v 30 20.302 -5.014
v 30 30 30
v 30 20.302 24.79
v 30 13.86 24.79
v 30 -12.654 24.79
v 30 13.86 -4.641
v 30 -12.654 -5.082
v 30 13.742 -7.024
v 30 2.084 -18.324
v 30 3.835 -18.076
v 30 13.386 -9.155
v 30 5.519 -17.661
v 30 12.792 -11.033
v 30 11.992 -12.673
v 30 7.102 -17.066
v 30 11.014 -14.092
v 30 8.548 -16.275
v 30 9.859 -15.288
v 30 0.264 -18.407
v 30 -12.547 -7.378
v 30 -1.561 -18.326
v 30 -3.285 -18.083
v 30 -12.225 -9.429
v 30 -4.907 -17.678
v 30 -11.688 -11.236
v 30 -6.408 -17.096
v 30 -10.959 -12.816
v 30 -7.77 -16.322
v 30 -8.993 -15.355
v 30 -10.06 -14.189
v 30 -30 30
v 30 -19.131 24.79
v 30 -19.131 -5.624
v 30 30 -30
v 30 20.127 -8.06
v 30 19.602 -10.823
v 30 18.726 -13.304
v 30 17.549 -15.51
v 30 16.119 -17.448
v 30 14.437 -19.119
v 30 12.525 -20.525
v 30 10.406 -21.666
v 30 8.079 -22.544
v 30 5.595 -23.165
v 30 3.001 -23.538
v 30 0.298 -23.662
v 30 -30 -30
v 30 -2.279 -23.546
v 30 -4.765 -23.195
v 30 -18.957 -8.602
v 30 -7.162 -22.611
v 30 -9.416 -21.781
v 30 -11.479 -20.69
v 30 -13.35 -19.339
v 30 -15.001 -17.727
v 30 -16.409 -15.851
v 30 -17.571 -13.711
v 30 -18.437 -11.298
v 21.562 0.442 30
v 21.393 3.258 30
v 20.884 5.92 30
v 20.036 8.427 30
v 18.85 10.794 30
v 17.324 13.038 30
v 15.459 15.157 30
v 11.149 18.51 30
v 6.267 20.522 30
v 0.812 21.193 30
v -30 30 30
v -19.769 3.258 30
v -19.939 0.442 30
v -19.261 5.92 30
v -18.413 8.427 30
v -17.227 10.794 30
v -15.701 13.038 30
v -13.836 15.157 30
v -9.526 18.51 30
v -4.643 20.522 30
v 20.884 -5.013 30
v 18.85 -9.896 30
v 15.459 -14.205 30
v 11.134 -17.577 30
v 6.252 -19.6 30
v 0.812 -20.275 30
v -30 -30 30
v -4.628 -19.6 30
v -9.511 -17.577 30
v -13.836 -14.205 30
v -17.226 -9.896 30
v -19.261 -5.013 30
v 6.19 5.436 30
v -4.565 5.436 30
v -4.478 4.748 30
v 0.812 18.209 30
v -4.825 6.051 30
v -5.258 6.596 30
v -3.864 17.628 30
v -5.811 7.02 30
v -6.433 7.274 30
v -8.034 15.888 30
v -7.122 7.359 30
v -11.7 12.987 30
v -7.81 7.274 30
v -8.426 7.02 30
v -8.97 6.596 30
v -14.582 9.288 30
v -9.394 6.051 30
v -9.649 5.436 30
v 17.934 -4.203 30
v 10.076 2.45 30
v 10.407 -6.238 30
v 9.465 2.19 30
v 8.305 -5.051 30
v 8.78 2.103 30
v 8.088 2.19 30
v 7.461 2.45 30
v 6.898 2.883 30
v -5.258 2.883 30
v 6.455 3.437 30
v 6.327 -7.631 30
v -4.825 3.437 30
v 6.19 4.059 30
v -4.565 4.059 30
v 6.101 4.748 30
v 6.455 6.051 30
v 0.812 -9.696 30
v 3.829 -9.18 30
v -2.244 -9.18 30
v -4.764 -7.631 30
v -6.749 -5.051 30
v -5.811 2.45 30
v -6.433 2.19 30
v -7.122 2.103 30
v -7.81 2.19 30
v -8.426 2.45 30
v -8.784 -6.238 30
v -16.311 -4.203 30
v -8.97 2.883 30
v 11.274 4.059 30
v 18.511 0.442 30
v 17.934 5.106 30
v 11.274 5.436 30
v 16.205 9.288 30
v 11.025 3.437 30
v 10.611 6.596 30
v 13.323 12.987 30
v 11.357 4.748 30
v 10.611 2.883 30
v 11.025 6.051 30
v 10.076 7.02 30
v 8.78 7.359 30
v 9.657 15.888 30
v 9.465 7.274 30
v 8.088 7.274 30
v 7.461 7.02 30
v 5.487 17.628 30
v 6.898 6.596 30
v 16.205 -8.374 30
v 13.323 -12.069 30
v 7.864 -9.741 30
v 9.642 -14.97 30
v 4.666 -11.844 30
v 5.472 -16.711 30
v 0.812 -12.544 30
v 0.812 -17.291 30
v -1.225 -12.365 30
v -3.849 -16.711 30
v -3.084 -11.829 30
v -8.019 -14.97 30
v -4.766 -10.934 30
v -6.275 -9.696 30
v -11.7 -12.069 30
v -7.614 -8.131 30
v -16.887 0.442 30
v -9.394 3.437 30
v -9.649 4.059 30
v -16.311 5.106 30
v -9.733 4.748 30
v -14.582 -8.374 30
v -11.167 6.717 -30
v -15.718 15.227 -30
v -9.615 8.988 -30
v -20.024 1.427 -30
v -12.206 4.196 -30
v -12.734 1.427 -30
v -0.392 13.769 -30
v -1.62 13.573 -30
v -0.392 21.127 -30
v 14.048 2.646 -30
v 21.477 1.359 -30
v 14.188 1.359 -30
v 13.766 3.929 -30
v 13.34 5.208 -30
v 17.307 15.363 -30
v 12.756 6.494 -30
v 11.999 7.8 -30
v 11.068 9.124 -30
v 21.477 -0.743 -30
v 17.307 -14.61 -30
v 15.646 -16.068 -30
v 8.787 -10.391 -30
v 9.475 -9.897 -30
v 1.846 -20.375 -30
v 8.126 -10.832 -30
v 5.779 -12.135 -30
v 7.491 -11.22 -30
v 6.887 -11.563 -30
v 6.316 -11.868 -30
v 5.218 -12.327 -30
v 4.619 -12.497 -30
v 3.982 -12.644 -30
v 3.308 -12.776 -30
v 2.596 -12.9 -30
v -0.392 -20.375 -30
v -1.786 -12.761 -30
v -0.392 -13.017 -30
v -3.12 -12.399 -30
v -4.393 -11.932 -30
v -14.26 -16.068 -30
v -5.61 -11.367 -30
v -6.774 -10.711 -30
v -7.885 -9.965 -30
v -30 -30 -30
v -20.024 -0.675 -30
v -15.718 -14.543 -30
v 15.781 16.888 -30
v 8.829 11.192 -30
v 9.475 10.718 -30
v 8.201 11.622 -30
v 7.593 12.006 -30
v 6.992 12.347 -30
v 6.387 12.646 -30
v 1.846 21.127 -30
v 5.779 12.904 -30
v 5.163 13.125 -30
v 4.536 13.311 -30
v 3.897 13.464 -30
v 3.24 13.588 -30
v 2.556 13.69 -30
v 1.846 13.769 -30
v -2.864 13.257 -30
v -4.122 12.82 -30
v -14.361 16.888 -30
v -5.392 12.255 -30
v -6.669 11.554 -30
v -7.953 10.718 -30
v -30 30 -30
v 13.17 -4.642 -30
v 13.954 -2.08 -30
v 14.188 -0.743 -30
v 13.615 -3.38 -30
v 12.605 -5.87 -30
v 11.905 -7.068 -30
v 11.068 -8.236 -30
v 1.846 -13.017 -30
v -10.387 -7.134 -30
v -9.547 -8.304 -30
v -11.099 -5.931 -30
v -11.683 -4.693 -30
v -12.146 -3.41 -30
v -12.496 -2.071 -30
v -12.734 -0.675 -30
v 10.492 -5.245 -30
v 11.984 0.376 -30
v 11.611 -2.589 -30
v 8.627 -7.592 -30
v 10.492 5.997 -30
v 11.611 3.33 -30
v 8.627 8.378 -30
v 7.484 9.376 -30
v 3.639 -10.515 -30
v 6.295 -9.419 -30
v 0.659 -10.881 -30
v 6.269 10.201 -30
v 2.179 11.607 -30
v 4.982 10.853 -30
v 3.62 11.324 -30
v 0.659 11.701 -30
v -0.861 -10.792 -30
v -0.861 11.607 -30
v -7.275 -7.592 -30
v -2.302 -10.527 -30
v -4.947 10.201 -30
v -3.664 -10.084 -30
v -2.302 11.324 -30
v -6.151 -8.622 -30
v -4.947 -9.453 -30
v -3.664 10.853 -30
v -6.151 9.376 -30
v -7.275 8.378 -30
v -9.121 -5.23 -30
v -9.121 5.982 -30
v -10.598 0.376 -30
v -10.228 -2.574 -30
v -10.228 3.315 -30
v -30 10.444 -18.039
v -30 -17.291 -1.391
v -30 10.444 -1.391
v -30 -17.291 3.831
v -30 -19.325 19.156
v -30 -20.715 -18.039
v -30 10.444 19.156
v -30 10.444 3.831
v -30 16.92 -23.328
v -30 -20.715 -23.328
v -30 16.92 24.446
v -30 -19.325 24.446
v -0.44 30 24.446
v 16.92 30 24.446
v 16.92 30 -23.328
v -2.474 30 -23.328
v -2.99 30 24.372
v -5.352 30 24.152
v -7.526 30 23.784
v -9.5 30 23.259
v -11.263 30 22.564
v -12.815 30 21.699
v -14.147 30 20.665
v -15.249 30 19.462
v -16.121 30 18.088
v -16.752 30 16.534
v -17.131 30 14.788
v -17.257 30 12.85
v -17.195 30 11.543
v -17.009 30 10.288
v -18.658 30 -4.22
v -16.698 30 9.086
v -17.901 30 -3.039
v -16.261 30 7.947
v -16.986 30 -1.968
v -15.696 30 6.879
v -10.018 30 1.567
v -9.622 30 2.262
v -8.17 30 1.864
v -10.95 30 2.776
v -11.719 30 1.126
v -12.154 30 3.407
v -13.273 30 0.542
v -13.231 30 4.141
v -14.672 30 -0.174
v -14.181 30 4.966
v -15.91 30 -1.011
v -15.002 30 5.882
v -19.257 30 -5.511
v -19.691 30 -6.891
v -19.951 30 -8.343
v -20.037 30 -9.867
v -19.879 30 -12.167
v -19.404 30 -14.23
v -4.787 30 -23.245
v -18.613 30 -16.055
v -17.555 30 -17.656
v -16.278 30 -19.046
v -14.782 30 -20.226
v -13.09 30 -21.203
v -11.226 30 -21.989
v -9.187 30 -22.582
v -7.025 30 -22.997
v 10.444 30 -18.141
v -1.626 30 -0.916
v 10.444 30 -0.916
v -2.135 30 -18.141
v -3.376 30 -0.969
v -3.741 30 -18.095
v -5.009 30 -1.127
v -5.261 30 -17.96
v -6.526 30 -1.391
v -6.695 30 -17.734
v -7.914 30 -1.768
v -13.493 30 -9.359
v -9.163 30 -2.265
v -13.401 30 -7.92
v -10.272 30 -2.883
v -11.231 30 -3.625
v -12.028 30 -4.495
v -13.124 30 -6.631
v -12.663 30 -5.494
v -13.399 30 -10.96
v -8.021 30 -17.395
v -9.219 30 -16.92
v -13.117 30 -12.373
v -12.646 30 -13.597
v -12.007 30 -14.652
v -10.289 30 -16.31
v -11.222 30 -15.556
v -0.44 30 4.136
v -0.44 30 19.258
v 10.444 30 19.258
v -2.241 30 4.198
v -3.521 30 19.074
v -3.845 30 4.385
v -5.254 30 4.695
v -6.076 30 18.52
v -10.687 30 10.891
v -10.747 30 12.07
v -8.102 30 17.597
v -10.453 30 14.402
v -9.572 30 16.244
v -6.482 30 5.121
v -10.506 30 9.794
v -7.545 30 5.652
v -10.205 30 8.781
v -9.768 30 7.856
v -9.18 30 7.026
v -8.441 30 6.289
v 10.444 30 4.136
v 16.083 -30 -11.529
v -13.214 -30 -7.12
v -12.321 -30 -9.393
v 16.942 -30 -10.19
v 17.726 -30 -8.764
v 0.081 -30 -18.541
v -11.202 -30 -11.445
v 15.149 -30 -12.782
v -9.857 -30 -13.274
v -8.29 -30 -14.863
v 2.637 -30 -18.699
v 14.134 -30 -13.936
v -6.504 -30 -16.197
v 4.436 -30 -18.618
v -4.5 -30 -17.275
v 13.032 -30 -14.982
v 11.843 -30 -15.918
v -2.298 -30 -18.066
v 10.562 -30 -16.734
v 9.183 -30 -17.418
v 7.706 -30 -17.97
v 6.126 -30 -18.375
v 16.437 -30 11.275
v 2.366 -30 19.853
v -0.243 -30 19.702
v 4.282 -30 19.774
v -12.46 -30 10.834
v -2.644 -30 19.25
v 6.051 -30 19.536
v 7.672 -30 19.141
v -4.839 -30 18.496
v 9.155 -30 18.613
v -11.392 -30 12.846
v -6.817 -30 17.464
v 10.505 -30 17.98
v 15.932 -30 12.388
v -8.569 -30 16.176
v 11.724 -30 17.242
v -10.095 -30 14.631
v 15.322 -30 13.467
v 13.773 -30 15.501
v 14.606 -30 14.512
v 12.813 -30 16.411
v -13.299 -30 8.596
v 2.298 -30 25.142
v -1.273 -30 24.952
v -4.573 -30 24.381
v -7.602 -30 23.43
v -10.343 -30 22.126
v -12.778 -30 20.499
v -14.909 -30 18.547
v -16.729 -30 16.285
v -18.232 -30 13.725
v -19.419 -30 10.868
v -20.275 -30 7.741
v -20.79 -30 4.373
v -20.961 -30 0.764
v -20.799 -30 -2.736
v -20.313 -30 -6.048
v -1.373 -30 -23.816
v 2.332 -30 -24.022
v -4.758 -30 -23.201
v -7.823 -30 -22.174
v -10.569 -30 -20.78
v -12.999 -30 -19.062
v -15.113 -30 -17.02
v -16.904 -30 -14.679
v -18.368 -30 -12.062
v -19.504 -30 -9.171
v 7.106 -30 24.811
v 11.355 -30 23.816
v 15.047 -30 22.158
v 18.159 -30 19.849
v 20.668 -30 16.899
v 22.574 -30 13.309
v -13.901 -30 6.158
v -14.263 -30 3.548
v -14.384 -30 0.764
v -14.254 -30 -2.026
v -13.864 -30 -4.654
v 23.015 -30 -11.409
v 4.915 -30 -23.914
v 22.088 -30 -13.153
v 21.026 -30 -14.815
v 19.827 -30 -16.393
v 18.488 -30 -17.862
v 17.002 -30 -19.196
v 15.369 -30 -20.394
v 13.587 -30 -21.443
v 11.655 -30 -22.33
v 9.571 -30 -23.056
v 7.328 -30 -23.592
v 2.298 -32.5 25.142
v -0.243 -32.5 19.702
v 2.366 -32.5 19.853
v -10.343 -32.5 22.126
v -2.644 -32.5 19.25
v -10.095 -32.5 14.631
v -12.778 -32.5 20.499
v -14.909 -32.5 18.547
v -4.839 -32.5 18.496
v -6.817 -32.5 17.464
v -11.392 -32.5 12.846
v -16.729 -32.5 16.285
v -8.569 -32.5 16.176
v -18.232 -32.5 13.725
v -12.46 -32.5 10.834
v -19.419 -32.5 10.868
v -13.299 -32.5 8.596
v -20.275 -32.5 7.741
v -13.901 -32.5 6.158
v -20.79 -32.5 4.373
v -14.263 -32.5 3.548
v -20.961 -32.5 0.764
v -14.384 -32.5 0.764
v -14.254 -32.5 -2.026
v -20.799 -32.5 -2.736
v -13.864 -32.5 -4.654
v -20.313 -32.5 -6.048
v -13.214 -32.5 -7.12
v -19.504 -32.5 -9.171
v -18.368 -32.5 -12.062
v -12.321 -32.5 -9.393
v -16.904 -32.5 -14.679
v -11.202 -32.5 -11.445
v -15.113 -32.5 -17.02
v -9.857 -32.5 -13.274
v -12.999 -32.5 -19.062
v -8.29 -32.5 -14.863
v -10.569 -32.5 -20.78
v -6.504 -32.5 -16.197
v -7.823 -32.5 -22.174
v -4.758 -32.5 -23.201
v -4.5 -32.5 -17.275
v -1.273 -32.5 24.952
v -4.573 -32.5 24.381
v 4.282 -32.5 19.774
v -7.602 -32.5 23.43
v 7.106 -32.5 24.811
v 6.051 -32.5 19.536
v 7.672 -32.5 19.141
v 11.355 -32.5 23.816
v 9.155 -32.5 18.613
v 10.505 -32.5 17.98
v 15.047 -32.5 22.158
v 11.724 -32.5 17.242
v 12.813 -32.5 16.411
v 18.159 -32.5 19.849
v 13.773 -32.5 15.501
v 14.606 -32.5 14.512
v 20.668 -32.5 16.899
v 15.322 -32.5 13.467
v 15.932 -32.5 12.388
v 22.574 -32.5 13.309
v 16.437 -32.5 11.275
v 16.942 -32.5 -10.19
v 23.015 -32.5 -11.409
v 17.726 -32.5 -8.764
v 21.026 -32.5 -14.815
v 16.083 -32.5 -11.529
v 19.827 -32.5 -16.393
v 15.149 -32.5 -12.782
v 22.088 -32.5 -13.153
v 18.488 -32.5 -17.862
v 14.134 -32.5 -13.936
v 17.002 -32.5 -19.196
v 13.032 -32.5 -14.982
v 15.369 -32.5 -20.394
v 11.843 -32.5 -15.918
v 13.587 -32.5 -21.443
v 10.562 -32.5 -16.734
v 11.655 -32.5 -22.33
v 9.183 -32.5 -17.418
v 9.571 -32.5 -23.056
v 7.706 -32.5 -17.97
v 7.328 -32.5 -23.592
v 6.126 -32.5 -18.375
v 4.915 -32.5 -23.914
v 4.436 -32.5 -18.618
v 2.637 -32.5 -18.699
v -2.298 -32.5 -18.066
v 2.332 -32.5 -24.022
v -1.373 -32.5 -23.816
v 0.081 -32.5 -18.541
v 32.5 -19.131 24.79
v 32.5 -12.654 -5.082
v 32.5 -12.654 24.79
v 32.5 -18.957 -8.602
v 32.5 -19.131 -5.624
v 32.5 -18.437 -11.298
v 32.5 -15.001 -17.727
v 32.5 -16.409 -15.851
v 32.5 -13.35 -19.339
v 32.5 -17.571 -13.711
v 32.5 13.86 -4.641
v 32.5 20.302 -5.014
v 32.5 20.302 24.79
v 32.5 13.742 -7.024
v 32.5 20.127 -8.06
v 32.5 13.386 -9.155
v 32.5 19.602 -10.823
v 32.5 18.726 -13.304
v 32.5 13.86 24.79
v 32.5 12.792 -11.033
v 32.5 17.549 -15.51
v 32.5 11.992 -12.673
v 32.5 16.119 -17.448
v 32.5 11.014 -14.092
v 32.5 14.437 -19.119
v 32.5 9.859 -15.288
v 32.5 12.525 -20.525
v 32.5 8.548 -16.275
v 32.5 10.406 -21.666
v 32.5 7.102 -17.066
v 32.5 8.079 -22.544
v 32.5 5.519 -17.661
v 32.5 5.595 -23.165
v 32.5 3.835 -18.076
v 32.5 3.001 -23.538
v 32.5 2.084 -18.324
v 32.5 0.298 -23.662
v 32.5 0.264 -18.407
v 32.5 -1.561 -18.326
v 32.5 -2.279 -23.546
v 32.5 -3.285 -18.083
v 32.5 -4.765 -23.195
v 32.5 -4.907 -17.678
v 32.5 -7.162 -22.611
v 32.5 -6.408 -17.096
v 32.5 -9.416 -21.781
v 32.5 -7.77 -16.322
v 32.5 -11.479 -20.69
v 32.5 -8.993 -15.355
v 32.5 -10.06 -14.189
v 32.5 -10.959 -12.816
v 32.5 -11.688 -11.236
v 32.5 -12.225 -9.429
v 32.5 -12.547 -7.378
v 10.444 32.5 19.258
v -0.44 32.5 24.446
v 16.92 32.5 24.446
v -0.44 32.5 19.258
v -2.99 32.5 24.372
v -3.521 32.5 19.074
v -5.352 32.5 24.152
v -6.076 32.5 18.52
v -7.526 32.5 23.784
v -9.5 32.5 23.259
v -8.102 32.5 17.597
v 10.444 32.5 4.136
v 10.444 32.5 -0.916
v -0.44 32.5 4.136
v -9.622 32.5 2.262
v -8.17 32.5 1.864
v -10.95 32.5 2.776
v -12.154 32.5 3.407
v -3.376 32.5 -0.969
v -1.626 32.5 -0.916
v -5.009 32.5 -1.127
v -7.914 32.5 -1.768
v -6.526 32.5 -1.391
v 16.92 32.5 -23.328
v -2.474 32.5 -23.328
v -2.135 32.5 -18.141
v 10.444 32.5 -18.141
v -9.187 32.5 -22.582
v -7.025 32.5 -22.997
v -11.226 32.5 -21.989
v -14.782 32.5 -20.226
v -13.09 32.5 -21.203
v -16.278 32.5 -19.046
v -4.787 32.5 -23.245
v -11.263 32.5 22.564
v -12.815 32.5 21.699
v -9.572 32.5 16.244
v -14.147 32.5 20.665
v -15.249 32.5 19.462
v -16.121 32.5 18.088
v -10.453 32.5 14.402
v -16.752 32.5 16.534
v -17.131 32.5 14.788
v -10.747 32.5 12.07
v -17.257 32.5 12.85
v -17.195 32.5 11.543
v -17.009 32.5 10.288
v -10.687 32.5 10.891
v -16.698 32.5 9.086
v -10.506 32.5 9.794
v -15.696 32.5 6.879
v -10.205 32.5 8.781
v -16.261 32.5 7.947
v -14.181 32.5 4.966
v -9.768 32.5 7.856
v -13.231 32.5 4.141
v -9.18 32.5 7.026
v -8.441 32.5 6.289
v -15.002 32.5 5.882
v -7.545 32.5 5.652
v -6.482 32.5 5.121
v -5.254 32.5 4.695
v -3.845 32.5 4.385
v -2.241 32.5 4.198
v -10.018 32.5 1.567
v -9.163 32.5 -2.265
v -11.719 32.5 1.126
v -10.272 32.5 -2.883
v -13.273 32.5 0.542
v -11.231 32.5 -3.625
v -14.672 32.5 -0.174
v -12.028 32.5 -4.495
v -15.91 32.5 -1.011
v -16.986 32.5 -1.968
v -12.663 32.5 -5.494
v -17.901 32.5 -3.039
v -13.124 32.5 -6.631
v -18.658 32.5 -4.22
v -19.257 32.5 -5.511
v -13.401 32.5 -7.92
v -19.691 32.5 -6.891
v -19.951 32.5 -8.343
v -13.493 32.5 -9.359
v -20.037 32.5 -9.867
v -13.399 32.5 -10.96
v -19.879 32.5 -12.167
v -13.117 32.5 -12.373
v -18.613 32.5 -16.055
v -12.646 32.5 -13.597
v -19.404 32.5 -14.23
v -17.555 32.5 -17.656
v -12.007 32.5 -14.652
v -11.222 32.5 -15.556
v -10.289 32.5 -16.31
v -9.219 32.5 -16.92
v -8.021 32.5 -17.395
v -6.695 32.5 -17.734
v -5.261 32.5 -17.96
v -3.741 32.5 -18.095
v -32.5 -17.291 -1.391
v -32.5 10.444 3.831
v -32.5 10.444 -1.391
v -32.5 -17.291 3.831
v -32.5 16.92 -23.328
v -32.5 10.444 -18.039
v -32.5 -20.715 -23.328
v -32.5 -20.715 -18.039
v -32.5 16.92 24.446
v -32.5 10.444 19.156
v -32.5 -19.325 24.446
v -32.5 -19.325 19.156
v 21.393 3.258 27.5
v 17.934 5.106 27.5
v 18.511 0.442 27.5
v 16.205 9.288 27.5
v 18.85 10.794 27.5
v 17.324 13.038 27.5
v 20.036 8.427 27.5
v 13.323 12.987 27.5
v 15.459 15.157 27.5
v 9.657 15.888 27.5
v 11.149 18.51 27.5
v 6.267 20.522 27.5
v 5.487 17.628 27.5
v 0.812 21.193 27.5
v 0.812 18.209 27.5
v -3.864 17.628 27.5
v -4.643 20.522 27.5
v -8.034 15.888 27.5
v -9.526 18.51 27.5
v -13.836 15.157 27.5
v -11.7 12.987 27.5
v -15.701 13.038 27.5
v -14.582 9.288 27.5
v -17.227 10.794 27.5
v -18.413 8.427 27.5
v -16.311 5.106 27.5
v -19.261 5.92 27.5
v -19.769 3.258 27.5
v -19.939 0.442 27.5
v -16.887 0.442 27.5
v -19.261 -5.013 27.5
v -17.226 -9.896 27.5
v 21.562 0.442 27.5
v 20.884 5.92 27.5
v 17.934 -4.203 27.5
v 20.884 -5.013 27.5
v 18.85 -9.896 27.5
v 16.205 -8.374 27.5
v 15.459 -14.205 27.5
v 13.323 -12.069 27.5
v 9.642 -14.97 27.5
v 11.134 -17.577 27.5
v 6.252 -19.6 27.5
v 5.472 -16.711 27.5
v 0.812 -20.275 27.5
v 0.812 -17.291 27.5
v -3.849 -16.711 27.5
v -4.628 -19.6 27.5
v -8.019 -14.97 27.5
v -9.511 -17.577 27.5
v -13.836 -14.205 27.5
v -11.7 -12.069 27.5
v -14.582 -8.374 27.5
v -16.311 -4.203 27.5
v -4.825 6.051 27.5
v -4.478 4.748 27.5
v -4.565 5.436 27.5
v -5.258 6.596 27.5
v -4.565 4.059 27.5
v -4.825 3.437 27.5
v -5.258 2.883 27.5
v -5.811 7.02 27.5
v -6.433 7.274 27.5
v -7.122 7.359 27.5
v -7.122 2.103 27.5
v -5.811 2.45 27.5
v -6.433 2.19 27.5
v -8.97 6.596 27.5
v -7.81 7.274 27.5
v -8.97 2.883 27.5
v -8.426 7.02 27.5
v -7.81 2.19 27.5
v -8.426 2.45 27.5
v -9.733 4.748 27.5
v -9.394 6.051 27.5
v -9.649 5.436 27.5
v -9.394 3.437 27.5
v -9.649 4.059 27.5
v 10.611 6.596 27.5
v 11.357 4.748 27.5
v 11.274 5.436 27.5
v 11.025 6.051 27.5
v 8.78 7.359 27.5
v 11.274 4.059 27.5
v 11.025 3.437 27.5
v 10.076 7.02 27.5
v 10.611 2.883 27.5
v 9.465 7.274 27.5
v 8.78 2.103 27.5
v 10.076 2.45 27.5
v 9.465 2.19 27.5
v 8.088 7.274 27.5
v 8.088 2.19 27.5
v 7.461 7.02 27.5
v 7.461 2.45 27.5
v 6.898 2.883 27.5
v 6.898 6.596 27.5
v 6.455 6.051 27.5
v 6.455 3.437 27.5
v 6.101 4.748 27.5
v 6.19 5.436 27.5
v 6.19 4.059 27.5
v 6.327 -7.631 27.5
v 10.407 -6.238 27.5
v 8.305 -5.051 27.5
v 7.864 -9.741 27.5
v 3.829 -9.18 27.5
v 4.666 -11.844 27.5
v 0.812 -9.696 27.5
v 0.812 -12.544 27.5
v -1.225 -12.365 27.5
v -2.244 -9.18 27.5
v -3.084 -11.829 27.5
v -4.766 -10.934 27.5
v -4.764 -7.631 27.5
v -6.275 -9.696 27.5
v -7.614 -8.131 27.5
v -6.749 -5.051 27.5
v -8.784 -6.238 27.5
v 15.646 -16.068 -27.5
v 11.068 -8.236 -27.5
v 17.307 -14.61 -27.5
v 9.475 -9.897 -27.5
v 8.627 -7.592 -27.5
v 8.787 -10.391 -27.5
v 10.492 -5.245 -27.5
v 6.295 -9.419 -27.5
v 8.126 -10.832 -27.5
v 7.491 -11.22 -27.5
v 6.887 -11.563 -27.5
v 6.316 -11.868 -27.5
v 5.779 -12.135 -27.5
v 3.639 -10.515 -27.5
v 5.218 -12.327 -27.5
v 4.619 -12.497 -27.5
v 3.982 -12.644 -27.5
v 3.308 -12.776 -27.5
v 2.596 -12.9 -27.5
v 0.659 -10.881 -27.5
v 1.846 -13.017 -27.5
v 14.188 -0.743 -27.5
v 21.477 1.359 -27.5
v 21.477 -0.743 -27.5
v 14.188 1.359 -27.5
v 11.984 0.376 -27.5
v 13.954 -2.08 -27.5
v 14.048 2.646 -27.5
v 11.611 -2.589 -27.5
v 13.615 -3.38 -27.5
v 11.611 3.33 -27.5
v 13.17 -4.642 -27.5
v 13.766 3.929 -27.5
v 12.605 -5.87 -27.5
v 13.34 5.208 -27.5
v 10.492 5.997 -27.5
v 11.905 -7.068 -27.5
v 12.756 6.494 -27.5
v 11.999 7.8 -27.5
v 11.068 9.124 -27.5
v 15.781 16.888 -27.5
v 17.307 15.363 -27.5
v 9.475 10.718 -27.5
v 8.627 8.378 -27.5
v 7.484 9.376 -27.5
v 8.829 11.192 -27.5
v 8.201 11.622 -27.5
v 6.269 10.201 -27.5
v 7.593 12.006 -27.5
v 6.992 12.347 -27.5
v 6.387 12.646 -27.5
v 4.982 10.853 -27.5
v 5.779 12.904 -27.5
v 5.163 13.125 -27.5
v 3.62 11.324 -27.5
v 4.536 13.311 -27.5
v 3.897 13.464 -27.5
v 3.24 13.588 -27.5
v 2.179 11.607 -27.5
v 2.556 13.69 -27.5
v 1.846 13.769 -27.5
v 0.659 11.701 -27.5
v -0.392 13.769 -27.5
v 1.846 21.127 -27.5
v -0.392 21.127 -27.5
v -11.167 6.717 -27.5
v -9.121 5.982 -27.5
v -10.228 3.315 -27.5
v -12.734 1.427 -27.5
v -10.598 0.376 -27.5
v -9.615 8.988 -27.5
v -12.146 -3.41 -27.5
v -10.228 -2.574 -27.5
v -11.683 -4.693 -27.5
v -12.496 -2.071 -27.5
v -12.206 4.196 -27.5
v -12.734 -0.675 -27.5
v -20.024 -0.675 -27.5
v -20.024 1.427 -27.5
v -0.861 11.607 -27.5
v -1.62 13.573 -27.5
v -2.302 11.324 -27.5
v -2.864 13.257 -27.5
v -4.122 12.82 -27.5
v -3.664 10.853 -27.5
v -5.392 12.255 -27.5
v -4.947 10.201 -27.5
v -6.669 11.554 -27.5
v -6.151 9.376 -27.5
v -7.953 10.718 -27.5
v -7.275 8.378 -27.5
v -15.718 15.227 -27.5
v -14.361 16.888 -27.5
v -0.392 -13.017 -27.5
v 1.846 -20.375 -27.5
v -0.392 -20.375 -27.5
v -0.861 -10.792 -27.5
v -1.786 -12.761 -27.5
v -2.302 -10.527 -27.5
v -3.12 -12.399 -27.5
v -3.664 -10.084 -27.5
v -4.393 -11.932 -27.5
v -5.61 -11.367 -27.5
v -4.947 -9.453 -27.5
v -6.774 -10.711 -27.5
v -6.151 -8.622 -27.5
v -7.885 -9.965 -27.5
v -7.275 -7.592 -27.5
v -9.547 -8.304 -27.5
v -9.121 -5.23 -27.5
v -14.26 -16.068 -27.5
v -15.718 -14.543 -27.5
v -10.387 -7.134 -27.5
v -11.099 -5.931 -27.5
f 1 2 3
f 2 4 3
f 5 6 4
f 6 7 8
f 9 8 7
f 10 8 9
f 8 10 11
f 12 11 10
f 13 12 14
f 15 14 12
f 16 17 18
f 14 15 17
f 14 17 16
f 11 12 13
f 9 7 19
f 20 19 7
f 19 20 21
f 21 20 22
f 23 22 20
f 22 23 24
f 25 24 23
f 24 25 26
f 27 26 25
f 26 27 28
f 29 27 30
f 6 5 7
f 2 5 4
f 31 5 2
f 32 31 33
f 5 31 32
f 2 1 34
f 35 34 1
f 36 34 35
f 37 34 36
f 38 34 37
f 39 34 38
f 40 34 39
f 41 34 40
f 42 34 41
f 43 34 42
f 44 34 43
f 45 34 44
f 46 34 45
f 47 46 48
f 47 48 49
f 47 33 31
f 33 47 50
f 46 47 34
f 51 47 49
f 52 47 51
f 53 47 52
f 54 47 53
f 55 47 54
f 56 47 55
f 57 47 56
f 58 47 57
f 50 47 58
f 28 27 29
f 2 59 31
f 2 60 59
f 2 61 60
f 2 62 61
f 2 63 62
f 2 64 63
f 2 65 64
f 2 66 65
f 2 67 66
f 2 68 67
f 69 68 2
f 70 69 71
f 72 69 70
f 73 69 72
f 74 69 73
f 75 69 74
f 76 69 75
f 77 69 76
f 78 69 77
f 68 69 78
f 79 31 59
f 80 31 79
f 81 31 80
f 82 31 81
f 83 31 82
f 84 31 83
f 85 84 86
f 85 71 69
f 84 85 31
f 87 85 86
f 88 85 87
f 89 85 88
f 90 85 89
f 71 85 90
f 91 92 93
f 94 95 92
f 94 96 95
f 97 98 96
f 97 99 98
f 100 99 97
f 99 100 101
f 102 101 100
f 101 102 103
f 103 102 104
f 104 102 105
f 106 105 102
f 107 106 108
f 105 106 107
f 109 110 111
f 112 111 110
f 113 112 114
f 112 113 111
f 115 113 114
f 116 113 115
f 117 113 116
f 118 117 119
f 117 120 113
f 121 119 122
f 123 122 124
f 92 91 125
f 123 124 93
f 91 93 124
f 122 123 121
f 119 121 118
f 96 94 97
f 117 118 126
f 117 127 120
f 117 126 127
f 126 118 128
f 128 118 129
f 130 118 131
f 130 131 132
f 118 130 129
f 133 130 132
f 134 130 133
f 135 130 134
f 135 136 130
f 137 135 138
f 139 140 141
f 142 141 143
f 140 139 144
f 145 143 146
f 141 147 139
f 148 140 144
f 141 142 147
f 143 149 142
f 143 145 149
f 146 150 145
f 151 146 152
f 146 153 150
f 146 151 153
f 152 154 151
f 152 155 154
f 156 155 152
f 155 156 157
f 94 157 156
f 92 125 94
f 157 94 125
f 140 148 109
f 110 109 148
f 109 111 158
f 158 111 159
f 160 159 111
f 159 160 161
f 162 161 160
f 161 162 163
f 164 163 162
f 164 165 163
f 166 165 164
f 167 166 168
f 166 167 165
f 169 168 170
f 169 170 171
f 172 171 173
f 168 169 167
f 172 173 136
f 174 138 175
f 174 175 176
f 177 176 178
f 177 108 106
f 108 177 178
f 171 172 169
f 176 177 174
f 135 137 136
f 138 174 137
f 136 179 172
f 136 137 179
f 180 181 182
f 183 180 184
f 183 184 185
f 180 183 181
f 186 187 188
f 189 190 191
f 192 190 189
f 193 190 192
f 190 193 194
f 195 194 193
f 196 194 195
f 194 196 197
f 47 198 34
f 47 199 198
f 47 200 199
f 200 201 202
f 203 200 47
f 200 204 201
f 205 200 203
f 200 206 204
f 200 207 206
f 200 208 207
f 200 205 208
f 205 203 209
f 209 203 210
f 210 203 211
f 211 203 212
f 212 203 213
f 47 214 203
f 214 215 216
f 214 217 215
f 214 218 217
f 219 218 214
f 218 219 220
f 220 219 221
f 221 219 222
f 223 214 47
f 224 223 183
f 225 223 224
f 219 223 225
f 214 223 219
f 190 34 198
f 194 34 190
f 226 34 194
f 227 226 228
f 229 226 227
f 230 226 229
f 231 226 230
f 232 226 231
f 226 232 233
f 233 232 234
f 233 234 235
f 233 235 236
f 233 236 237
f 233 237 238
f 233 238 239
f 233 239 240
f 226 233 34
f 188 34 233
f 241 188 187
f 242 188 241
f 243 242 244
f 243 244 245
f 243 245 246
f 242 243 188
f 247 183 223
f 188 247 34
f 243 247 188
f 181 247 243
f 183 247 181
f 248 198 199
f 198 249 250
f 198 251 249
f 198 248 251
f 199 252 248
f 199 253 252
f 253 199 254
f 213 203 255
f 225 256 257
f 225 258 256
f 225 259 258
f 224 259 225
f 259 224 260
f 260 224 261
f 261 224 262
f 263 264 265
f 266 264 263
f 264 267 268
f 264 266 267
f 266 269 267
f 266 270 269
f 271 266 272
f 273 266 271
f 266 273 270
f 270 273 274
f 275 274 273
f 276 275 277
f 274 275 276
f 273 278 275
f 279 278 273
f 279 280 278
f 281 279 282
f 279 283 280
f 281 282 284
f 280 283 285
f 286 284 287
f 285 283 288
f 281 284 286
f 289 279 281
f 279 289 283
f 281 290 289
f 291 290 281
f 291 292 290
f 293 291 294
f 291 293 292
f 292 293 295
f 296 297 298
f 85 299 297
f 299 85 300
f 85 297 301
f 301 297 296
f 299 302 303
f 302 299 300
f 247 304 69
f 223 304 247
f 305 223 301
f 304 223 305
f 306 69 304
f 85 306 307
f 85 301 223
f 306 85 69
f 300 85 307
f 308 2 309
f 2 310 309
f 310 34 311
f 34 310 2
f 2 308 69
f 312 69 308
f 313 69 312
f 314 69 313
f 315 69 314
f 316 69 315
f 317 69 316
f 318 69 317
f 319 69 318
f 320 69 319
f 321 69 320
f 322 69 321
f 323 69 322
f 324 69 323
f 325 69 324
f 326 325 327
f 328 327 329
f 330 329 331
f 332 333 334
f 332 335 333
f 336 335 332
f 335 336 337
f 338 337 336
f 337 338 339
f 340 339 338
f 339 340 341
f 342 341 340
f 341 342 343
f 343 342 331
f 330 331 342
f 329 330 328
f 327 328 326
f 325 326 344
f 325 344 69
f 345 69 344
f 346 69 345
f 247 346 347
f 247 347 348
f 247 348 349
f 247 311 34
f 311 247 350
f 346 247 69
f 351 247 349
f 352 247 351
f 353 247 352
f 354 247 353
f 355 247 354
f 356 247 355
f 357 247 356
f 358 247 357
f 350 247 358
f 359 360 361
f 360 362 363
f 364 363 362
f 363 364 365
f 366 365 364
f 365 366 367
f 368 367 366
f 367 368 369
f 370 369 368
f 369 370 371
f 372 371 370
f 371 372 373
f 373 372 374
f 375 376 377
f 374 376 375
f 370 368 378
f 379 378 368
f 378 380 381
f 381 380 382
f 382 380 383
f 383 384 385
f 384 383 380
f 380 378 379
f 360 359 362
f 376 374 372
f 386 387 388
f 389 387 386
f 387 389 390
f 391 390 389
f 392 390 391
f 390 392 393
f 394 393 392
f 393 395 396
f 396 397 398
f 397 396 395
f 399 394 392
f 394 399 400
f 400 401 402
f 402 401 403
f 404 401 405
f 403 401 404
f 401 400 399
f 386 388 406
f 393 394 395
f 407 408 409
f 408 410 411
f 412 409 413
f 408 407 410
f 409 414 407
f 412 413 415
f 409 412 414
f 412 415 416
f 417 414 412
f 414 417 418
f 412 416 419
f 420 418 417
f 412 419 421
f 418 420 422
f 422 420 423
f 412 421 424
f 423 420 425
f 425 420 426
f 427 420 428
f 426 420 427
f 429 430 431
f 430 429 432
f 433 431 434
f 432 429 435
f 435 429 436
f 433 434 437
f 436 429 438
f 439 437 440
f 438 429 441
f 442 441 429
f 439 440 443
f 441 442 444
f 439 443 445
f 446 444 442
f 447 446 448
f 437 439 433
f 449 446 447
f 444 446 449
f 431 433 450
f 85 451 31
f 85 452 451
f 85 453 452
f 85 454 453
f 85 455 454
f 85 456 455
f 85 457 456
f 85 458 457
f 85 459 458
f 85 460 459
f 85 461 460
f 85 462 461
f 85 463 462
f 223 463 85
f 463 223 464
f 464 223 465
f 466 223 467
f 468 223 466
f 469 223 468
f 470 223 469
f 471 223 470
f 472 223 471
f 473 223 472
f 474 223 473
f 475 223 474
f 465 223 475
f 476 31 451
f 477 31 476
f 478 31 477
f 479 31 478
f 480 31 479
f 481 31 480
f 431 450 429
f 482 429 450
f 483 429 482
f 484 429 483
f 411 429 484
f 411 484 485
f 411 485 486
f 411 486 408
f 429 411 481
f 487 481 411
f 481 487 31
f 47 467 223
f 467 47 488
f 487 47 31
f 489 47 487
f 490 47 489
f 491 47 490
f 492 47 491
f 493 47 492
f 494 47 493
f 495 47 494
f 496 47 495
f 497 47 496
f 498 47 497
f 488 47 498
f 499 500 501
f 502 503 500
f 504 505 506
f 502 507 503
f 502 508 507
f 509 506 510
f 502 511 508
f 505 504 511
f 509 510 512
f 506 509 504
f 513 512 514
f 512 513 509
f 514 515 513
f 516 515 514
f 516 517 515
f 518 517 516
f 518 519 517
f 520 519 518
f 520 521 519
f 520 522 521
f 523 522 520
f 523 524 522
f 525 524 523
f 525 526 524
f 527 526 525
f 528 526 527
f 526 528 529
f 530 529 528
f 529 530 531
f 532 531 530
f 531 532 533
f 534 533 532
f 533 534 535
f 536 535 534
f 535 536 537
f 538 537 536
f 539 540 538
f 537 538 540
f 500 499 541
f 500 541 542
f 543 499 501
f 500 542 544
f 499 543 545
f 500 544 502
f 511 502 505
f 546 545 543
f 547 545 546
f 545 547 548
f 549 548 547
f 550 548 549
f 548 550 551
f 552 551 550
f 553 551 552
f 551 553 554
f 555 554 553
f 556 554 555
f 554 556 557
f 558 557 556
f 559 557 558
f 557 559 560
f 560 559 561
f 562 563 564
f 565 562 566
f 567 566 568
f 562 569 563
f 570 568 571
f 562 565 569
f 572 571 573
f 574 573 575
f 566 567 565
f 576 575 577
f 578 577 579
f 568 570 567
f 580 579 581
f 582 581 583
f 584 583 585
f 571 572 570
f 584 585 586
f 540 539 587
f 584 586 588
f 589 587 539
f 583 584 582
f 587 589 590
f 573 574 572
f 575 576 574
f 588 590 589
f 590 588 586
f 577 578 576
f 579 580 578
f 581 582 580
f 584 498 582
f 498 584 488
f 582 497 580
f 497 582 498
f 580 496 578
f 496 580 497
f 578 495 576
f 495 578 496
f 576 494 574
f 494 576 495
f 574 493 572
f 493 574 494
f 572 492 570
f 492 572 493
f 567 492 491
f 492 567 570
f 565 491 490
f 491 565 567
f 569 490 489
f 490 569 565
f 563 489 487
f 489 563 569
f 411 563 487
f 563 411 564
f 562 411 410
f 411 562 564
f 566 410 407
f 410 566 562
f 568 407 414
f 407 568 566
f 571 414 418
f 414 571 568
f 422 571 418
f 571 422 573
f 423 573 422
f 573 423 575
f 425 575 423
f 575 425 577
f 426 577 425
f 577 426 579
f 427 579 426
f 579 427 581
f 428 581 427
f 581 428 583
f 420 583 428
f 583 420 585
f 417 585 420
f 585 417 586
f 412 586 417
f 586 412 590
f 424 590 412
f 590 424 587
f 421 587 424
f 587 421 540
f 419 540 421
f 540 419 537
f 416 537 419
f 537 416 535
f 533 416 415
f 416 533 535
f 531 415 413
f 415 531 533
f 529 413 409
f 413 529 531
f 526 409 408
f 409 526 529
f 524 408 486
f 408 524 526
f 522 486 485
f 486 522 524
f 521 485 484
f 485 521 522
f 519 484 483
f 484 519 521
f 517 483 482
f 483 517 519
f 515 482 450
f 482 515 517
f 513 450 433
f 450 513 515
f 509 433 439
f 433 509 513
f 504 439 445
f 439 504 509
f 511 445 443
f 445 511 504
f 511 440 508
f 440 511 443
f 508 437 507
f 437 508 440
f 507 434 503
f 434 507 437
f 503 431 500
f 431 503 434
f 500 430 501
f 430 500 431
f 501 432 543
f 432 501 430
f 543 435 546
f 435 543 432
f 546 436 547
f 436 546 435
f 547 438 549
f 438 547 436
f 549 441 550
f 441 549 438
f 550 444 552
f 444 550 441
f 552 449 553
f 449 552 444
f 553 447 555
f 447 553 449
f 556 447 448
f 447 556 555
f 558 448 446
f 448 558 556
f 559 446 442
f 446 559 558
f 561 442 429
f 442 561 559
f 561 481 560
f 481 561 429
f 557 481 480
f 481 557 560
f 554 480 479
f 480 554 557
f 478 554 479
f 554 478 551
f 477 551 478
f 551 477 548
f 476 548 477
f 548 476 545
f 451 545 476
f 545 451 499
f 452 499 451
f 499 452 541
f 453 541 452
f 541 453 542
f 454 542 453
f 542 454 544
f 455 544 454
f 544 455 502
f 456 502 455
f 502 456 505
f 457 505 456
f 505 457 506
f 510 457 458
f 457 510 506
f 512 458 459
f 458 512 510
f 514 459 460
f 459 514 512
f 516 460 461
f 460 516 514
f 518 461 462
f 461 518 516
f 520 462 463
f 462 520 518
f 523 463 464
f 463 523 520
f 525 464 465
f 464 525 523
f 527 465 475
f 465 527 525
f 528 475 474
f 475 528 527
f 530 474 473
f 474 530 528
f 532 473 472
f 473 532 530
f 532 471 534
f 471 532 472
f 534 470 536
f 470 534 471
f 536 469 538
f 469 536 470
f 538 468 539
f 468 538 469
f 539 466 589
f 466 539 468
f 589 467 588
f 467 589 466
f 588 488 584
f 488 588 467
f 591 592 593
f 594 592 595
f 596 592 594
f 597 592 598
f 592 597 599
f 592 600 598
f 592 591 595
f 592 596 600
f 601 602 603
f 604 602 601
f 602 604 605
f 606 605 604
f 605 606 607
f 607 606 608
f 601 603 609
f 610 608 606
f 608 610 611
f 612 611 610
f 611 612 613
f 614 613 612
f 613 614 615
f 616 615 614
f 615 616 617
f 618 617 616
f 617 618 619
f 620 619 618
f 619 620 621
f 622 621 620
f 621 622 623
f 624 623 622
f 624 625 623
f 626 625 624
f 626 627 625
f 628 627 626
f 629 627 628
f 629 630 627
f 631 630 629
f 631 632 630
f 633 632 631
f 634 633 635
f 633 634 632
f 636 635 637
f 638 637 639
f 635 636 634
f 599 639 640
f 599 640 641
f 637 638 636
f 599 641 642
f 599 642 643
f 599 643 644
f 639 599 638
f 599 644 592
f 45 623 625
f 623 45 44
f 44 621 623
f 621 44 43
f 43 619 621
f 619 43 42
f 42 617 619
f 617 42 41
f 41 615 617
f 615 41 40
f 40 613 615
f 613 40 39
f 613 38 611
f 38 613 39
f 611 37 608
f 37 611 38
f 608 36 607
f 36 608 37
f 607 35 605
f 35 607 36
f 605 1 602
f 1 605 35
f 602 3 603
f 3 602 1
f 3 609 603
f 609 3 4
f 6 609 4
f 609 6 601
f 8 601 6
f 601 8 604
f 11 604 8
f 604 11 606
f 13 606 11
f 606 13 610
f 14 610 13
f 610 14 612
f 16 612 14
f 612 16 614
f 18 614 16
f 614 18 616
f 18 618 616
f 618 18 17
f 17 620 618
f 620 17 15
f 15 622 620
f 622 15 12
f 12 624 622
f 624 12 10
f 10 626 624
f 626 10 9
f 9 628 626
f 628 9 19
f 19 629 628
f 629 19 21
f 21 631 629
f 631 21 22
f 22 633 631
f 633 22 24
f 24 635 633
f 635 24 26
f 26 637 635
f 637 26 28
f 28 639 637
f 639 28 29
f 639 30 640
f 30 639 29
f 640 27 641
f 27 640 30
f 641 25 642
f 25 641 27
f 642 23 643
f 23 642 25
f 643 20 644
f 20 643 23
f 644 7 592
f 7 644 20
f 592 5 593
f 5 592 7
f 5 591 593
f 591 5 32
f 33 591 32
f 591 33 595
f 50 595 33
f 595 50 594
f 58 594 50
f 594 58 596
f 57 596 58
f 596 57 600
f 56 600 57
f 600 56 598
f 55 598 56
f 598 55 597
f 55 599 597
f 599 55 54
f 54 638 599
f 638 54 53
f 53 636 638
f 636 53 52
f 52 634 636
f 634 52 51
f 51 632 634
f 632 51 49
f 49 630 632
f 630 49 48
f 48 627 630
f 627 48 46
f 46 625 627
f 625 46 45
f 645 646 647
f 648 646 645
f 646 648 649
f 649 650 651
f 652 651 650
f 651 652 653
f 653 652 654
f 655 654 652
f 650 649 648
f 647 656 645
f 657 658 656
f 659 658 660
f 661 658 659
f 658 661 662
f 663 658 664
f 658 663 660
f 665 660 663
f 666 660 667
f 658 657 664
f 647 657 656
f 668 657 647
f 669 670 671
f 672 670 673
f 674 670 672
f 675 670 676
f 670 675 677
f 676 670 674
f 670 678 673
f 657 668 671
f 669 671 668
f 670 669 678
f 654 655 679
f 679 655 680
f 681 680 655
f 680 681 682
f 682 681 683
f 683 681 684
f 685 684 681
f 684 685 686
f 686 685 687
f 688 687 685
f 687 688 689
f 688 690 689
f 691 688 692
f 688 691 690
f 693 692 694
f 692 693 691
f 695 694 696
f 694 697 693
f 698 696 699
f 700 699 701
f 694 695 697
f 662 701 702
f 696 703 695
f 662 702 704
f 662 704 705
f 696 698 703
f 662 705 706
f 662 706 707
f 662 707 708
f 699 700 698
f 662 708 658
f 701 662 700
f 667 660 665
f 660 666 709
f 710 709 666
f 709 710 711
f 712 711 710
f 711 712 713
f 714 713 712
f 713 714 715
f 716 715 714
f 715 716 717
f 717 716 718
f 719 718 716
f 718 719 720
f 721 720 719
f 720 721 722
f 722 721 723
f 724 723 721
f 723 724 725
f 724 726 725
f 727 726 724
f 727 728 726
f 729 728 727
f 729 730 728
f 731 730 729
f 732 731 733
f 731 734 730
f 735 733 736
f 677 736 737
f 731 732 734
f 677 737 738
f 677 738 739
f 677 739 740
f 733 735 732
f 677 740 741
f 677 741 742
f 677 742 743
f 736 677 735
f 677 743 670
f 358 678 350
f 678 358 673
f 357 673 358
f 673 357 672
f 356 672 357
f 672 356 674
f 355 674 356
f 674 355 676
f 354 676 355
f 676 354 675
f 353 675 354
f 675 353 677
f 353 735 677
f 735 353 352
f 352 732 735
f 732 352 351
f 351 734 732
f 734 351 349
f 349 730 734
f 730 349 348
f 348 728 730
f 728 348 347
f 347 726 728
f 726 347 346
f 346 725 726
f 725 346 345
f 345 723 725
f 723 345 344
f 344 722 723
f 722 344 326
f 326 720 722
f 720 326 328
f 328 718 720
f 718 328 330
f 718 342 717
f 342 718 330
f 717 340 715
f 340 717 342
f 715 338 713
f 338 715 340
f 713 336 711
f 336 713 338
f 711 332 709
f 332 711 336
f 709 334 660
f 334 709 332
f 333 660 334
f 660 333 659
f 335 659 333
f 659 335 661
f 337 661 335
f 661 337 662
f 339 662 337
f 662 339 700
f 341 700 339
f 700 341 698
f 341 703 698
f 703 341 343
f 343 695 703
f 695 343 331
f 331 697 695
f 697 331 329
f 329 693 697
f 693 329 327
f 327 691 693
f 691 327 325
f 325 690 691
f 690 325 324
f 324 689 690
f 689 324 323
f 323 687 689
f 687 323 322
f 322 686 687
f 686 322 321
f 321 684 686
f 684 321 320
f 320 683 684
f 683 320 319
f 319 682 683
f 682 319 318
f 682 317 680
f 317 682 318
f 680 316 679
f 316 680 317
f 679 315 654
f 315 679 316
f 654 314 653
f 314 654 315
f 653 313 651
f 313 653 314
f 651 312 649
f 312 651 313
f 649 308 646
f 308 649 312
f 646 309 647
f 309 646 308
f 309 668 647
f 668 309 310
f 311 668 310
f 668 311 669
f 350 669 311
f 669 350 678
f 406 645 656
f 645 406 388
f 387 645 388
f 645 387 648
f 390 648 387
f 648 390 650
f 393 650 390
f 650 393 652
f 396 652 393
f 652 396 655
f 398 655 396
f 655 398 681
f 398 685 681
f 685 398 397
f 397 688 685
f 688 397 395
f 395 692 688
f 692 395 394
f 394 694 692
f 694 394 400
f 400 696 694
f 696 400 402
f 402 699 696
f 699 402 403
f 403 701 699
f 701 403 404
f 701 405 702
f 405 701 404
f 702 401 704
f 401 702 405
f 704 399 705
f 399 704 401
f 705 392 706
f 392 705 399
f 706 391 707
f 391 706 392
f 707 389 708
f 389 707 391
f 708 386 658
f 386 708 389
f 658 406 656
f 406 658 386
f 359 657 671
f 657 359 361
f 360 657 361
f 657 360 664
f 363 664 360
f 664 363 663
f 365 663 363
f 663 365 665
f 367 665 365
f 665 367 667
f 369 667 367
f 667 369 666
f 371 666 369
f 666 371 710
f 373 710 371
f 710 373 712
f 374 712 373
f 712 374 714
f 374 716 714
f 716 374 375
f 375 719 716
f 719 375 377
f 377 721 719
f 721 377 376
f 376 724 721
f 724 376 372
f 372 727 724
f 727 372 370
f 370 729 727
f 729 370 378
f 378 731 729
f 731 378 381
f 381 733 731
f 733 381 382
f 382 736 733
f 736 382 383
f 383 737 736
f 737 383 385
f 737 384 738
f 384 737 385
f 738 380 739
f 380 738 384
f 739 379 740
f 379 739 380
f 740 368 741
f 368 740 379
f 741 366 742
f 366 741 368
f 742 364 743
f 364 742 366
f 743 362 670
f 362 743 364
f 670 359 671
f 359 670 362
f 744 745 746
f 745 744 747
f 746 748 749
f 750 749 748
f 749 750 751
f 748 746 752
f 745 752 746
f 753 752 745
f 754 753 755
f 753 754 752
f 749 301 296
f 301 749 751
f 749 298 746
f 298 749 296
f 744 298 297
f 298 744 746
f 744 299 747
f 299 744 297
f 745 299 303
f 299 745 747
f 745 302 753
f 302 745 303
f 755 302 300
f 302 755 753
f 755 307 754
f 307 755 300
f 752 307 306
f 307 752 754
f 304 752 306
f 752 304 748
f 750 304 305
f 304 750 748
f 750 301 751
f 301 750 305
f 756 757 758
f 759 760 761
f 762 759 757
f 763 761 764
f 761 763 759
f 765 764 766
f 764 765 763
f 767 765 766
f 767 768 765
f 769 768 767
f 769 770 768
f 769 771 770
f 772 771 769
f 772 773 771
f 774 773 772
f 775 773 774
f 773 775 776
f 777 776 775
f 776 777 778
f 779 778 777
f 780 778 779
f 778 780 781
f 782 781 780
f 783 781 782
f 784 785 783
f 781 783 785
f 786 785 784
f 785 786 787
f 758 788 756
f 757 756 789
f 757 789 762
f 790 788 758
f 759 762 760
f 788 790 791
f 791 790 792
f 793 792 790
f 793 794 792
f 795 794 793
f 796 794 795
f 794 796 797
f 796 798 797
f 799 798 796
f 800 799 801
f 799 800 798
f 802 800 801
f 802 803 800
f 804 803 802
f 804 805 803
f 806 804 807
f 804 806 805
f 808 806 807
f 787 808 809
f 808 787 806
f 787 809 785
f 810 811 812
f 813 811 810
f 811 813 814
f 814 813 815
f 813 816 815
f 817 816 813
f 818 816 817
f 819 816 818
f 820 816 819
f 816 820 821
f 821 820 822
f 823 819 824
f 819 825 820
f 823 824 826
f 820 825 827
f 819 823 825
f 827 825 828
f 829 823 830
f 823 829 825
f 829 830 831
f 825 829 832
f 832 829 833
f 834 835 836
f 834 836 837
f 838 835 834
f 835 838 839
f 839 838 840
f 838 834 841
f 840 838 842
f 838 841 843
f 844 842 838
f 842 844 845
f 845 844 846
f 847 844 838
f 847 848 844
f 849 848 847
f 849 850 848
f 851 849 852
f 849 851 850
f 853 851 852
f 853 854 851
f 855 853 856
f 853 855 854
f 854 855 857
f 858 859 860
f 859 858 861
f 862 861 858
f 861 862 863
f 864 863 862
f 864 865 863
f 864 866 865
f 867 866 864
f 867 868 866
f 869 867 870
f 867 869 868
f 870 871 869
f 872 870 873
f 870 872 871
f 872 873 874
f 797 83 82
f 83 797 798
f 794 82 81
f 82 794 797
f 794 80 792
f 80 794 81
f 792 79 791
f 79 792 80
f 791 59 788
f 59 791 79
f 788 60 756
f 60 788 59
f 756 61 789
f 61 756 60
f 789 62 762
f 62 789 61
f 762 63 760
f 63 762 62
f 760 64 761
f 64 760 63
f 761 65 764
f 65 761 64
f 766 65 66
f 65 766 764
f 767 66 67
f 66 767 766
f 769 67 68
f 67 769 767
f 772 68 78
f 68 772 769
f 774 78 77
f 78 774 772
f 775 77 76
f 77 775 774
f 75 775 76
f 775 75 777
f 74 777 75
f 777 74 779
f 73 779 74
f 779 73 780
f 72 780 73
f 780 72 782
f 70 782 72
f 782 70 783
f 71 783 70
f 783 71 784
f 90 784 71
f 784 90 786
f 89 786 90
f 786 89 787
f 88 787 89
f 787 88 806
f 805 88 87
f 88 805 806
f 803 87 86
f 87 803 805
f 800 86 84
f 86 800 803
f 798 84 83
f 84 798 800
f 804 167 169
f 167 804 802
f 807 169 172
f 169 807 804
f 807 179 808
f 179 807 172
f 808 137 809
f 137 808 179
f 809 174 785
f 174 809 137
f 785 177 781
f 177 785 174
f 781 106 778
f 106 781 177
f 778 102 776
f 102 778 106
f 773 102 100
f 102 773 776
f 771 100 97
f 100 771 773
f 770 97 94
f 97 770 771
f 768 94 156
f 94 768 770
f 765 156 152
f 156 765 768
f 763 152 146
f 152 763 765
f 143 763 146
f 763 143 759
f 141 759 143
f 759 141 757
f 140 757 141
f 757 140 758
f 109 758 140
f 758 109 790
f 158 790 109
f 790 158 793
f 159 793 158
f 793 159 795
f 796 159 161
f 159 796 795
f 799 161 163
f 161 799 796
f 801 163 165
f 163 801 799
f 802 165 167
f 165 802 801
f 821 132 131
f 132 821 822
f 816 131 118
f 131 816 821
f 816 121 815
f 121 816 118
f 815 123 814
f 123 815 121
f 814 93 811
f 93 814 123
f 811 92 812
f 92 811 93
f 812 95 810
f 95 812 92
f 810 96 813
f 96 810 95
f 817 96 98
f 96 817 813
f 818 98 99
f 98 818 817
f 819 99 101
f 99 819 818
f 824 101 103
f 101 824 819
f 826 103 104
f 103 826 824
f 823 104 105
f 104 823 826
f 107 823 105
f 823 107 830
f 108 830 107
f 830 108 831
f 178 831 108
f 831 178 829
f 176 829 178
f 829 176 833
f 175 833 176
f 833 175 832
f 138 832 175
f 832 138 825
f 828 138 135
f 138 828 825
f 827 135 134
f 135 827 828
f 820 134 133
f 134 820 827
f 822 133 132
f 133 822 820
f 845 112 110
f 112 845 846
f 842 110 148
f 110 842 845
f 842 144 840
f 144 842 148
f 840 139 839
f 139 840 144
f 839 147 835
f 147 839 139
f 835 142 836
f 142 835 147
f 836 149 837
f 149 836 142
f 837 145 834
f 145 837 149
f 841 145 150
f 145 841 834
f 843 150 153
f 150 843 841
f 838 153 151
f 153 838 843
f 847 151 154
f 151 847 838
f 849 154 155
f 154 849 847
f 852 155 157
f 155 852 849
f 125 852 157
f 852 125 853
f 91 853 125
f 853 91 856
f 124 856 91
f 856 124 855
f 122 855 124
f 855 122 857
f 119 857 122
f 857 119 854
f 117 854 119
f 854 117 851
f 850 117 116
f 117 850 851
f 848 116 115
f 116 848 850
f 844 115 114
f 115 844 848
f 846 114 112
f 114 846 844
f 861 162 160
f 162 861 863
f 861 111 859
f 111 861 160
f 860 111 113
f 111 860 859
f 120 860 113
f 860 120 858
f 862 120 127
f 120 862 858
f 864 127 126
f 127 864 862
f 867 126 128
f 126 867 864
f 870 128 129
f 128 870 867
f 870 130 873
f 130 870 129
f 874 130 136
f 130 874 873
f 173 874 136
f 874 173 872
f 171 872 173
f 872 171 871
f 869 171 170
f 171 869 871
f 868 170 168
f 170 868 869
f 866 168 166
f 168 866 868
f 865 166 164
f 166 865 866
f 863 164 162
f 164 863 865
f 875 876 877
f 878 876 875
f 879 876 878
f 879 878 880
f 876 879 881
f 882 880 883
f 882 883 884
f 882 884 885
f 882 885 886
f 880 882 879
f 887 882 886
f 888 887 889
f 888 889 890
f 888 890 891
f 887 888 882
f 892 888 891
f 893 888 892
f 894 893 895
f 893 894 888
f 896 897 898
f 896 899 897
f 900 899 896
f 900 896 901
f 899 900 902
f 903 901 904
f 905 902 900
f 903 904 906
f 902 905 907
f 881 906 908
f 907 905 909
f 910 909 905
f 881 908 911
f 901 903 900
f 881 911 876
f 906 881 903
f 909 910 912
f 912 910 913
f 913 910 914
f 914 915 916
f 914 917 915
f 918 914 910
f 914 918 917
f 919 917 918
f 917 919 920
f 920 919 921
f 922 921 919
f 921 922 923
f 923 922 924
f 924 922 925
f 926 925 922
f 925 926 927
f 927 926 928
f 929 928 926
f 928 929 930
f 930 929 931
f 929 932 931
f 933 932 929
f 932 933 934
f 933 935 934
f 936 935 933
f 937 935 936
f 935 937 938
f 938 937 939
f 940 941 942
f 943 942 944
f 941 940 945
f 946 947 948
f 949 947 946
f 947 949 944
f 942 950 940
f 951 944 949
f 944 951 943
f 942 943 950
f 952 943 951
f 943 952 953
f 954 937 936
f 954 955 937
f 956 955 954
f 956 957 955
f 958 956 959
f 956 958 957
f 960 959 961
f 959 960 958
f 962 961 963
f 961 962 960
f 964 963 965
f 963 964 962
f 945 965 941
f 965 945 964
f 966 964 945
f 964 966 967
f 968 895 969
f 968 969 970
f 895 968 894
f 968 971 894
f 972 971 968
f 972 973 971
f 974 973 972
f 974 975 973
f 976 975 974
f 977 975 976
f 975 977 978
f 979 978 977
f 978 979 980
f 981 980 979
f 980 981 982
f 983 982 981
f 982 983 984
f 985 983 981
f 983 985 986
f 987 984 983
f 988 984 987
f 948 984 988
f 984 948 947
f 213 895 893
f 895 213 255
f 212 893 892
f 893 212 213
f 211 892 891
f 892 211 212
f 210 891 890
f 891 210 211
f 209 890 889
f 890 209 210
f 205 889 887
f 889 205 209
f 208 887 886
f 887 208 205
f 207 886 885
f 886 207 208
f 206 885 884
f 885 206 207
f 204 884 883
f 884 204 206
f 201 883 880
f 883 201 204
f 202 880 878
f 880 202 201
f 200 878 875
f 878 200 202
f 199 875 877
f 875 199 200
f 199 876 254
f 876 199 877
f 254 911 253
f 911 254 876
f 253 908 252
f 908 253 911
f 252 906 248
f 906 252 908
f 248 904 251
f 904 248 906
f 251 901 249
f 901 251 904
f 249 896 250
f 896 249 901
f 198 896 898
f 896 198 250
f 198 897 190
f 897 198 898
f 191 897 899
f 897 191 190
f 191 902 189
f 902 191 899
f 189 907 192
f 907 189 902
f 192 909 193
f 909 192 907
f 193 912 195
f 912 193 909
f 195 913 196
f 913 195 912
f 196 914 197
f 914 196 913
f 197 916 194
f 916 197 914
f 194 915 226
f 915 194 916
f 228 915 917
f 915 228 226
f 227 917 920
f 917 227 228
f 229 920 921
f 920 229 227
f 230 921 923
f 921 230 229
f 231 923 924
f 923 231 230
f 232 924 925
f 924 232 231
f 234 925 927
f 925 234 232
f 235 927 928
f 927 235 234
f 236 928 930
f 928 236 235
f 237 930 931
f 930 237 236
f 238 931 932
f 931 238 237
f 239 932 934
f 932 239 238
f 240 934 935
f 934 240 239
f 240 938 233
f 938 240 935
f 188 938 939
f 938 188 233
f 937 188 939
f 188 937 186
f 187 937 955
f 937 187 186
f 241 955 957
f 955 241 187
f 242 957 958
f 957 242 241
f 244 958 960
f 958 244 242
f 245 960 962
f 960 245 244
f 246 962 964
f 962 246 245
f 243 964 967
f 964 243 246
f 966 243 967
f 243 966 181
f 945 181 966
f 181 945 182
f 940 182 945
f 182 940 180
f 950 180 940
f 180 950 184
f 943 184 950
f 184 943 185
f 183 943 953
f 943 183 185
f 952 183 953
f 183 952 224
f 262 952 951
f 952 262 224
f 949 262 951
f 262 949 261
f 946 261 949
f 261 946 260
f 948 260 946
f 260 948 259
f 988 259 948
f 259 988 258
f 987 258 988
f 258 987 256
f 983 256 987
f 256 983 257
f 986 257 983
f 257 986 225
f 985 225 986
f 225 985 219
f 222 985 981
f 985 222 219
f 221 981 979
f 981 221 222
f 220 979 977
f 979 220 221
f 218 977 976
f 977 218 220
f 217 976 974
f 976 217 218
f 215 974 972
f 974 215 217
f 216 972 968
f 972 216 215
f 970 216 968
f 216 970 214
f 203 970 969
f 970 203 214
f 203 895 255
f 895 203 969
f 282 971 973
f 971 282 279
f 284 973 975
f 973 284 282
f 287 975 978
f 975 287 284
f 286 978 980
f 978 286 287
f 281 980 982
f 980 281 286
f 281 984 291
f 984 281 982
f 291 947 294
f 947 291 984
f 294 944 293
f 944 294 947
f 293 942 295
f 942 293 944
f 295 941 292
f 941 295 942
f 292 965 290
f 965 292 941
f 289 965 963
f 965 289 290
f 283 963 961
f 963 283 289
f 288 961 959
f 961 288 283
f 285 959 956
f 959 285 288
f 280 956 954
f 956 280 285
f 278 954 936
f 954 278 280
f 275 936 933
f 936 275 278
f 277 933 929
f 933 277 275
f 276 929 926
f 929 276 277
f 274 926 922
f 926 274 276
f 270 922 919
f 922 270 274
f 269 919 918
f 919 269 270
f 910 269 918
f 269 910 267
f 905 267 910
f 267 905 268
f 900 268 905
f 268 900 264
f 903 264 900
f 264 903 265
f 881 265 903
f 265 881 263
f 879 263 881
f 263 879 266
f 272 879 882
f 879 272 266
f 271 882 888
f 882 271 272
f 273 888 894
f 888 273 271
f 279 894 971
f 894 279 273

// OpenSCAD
// Volume: 221636.43770043965, SurfaceArea: 25772.122639432226
// text_on_cube.scad - Example for text() usage in OpenSCAD

echo(version=version());

font = "Liberation Sans"; //["Liberation Sans", "Liberation Sans:style=Bold", "Liberation Sans:style=Italic", "Liberation Mono", "Liberation Serif"]

cube_size = 60;
letter_size = 50;
letter_height = 5;

o = cube_size / 2 - letter_height / 2;

module letter(l) {
  // Use linear_extrude() to make the letters 3D objects as they
  // are only 2D shapes when only using text()
  linear_extrude(height = letter_height) {
    text(l, size = letter_size, font = font, halign = "center", valign = "center", $fn = 16);
  }
}

difference() {
  union() {
    color("gray") cube(cube_size, center = true);
    translate([0, -o, 0]) rotate([90, 0, 0]) letter("C");
    translate([o, 0, 0]) rotate([90, 0, 90]) letter("U");
    translate([0, o, 0]) rotate([90, 0, 180]) letter("B");
    translate([-o, 0, 0]) rotate([90, 0, -90]) letter("E");
  }

  // Put some symbols on top and bottom using symbols from the
  // Unicode symbols table.
  // (see https://en.wikipedia.org/wiki/Miscellaneous_Symbols)
  //
  // Note that depending on the font used, not all the symbols
  // are actually available.
  translate([0, 0, o])  letter("\u263A");
  translate([0, 0, -o - letter_height])  letter("\u263C");
}



// Written in 2014 by Torsten Paul <Torsten.Paul@gmx.de>
//
// To the extent possible under law, the author(s) have dedicated all
// copyright and related and neighboring rights to this software to the
// public domain worldwide. This software is distributed without any
// warranty.
//
// You should have received a copy of the CC0 Public Domain
// Dedication along with this software.
// If not, see <http://creativecommons.org/publicdomain/zero/1.0/>.
